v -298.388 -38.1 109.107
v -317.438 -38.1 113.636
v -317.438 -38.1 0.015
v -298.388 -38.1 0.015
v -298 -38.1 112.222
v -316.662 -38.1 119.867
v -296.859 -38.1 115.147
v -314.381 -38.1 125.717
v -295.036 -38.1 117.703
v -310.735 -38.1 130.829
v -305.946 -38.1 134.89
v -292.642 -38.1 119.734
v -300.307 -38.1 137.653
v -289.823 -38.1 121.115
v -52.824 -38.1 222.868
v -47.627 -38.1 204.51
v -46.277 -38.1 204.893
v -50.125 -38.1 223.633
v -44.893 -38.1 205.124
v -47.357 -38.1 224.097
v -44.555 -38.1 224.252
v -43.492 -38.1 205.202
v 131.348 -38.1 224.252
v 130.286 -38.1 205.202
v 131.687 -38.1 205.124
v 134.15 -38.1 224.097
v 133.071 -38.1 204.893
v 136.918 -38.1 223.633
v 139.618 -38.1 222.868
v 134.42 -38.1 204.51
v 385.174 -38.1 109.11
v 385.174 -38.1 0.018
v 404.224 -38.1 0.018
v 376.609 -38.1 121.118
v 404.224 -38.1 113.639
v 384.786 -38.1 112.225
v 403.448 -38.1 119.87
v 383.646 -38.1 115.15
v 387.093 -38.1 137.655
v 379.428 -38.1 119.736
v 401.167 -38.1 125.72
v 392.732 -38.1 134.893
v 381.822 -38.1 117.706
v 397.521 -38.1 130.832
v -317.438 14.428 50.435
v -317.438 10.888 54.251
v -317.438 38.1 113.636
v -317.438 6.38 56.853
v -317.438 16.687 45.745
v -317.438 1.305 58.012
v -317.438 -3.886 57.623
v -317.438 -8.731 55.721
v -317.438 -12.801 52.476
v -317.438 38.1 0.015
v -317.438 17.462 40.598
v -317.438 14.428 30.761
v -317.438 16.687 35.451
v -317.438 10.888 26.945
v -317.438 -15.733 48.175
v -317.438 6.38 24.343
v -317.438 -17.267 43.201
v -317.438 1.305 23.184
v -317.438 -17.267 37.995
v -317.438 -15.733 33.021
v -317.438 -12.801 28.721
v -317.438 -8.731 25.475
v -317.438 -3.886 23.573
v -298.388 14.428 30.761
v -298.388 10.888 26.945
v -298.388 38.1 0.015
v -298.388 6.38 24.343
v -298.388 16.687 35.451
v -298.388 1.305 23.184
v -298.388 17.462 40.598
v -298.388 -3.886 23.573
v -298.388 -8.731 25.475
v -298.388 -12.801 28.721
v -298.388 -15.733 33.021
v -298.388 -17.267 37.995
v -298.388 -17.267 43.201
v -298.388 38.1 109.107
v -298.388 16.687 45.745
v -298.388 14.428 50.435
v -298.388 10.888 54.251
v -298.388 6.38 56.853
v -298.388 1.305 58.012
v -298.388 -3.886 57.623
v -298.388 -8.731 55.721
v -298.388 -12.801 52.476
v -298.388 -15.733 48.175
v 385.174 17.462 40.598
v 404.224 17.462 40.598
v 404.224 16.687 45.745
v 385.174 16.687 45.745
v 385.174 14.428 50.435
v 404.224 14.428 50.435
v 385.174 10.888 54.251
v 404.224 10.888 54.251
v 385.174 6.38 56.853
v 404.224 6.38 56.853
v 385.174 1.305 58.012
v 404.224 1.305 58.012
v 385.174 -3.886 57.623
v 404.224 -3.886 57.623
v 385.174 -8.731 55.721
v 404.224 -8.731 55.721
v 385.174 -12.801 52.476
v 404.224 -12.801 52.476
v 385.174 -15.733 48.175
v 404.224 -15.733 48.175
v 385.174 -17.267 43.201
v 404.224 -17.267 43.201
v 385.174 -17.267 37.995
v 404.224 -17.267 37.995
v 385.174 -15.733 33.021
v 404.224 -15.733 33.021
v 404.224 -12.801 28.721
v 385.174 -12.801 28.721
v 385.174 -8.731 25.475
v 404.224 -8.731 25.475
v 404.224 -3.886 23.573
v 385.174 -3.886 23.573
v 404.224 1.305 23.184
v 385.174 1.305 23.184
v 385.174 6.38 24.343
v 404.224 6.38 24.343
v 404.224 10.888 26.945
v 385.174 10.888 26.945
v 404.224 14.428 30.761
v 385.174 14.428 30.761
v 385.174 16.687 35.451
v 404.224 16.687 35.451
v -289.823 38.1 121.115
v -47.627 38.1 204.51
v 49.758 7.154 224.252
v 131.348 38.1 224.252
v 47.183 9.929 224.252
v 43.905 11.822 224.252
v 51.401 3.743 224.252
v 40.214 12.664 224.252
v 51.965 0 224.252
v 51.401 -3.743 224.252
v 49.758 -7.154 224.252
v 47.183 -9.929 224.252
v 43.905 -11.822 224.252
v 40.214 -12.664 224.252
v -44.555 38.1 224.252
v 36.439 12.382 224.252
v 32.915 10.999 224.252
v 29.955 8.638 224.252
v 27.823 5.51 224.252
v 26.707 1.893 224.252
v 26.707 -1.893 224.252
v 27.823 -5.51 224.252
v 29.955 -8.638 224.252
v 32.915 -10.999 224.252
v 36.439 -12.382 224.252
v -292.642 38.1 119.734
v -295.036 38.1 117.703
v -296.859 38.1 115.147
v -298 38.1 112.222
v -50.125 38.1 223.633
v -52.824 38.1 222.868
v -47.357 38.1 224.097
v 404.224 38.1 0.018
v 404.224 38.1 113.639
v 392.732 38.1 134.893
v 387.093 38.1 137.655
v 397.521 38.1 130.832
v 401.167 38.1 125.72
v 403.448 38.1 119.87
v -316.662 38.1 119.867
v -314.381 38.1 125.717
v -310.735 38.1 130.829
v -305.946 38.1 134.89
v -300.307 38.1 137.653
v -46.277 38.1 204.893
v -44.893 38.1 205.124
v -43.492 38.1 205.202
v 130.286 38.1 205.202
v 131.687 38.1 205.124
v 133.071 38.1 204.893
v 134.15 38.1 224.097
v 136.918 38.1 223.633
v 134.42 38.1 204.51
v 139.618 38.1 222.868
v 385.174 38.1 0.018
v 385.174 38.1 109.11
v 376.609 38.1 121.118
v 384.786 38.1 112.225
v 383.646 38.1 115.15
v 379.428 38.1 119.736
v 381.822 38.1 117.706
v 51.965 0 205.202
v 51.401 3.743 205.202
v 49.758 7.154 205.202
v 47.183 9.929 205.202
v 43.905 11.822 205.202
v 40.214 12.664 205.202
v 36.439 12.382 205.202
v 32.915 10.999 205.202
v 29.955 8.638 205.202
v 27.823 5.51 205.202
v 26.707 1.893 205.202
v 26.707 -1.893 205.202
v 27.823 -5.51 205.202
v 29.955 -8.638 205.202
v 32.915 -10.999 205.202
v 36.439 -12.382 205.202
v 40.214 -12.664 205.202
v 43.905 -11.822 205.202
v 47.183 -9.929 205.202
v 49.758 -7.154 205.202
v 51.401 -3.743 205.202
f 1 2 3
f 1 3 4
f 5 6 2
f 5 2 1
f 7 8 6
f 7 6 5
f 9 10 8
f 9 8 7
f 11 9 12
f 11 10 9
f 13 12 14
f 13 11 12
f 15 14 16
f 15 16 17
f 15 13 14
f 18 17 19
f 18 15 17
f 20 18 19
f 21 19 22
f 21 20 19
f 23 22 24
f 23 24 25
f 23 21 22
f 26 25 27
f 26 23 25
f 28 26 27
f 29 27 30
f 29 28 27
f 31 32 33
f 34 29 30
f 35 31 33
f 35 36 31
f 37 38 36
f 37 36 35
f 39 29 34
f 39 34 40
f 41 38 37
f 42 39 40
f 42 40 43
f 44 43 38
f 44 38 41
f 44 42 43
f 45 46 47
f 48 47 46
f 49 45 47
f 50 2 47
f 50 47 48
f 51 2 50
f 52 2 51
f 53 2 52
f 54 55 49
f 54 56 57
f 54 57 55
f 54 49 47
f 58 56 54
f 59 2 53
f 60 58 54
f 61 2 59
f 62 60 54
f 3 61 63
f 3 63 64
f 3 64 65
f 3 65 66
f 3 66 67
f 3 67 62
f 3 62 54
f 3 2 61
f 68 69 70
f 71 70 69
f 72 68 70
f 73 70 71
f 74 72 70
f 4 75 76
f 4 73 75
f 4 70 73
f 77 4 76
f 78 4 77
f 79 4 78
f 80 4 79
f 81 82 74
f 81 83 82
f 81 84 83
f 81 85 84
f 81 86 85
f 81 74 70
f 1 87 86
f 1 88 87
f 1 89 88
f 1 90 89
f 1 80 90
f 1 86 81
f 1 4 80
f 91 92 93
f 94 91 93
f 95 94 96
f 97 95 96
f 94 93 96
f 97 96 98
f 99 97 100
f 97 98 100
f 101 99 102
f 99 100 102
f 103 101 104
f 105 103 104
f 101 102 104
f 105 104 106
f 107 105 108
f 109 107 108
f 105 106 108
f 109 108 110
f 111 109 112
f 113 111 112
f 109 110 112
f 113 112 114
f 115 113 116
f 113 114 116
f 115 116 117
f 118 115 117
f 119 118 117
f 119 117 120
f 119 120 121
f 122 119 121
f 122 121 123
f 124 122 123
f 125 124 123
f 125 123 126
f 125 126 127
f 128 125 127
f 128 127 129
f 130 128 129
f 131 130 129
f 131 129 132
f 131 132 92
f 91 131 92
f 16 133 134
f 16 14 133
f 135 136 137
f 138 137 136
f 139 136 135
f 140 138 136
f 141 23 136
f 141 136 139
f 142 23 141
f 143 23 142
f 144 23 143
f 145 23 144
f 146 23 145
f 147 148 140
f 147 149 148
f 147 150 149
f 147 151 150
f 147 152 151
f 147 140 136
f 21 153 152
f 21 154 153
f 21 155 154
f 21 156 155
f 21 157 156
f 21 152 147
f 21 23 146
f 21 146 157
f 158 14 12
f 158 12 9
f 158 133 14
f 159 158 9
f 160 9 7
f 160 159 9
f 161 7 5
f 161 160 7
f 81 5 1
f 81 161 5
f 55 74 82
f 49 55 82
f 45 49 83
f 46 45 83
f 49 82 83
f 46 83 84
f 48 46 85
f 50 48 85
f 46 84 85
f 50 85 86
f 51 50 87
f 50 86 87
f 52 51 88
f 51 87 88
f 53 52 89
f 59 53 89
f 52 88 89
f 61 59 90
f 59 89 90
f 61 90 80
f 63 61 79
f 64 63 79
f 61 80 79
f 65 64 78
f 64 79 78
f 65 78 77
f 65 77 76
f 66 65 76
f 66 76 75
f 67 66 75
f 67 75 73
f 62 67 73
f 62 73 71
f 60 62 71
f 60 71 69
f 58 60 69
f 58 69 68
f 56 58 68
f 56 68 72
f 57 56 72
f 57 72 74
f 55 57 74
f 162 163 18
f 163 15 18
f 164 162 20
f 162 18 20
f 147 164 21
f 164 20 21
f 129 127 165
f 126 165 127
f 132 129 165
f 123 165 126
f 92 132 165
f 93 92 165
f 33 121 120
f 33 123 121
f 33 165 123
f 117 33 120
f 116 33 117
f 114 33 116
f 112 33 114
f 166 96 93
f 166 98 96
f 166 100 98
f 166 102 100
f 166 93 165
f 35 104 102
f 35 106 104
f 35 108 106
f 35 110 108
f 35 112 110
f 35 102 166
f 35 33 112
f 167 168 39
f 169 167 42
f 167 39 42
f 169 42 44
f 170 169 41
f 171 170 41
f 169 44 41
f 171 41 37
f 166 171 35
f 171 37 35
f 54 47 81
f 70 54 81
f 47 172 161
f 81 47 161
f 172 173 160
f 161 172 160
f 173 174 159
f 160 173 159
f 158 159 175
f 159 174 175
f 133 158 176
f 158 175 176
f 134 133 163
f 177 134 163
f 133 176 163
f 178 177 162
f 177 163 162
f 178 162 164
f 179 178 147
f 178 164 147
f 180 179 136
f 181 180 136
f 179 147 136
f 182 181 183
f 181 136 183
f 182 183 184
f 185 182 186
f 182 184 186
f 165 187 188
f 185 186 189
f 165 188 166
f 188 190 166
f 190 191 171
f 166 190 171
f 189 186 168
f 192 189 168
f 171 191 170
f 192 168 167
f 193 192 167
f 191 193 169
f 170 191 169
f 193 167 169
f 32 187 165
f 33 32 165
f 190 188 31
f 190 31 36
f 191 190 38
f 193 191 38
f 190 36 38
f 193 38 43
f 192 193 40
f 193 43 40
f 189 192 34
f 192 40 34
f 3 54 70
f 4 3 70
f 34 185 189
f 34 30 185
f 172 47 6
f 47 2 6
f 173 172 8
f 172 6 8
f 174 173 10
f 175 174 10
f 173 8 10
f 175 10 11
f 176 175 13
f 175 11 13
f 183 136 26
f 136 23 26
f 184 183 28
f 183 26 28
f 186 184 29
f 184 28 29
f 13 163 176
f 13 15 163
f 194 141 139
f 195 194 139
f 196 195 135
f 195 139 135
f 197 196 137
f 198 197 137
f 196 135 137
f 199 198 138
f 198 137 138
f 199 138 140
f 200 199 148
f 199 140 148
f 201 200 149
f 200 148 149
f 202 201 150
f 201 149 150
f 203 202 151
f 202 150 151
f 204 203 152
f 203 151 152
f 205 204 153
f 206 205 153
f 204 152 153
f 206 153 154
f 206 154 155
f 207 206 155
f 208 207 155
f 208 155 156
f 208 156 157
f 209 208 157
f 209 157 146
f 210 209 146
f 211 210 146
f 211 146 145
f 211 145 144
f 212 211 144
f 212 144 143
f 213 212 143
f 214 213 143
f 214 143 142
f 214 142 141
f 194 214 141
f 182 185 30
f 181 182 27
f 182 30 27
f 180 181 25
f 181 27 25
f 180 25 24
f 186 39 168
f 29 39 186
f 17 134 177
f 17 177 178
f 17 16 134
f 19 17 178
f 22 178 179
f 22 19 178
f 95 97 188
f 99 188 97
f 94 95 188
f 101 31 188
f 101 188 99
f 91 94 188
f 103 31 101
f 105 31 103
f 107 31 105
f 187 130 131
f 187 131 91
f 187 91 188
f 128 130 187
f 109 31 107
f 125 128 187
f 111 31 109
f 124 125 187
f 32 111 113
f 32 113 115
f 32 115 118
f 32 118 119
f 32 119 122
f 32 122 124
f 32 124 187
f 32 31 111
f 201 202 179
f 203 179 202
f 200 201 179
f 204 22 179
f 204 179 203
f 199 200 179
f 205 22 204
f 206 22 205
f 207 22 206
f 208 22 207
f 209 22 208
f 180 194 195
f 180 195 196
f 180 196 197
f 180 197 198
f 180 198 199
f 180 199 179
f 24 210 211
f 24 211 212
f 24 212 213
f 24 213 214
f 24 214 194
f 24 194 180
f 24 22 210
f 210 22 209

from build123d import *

# Parameters (mm, degrees)
F1_DEPTH = 38.1
F2_R     = 12.7
F3_R     = 25.4
F4_R     = 17.4625
F5_DEPTH = 721.6628119641
F6_R     = 12.7
F7_DEPTH = 224.2374025718


with BuildPart() as f1:
    # F0 (on Front) → F1 (new body, symmetric)
    with BuildSketch(Plane.XZ):
        Polygon((-298.3877922661, 118.1658460197), (-45.6175838582, 205.2016085916), (132.4110161418, 205.2016085916), (385.1740196981, 118.1683268491), (385.1740196981, 0.0176868491), (404.2240196981, 0.0176868491), (404.2240196981, 131.7565597925), (135.5988928448, 224.2516085916), (-48.8054605612, 224.2516085916), (-317.4377922661, 131.7540789632), (-317.4377922661, 0.0152060197), (-298.3877922661, 0.0152060197), align=None)
    extrude(amount=F1_DEPTH, both=True)

    # F2
    f2_edges = [f1.edges().sort_by_distance(p)[0] for p in [
        (-298.387792, 0, 118.165846),
        (-45.617584, 0, 205.201609),
        (132.411016, 0, 205.201609),
        (385.17402, 0, 118.168327),
    ]]
    fillet(f2_edges, radius=F2_R)

    # F3
    f3_edges = [f1.edges().sort_by_distance(p)[0] for p in [
        (-317.437792, 0, 131.754079),
        (-48.805461, 0, 224.251609),
        (135.598893, 0, 224.251609),
        (404.22402, 0, 131.75656),
    ]]
    fillet(f3_edges, radius=F3_R)

    # F4 (on face) → F5 (cut, through all)
    with BuildSketch(Plane.YZ.offset(404.2240196981)):
        with Locations((0, 40.5980758369)):
            Circle(F4_R)
    extrude(amount=-F5_DEPTH, mode=Mode.SUBTRACT)

    # F6 (on face) → F7 (cut, through all)
    with BuildSketch(Plane.XY.offset(224.2516085916)):
        with Locations((39.2650417094, 0)):
            Circle(F6_R)
    extrude(amount=-F7_DEPTH, mode=Mode.SUBTRACT)


solid = f1.part
